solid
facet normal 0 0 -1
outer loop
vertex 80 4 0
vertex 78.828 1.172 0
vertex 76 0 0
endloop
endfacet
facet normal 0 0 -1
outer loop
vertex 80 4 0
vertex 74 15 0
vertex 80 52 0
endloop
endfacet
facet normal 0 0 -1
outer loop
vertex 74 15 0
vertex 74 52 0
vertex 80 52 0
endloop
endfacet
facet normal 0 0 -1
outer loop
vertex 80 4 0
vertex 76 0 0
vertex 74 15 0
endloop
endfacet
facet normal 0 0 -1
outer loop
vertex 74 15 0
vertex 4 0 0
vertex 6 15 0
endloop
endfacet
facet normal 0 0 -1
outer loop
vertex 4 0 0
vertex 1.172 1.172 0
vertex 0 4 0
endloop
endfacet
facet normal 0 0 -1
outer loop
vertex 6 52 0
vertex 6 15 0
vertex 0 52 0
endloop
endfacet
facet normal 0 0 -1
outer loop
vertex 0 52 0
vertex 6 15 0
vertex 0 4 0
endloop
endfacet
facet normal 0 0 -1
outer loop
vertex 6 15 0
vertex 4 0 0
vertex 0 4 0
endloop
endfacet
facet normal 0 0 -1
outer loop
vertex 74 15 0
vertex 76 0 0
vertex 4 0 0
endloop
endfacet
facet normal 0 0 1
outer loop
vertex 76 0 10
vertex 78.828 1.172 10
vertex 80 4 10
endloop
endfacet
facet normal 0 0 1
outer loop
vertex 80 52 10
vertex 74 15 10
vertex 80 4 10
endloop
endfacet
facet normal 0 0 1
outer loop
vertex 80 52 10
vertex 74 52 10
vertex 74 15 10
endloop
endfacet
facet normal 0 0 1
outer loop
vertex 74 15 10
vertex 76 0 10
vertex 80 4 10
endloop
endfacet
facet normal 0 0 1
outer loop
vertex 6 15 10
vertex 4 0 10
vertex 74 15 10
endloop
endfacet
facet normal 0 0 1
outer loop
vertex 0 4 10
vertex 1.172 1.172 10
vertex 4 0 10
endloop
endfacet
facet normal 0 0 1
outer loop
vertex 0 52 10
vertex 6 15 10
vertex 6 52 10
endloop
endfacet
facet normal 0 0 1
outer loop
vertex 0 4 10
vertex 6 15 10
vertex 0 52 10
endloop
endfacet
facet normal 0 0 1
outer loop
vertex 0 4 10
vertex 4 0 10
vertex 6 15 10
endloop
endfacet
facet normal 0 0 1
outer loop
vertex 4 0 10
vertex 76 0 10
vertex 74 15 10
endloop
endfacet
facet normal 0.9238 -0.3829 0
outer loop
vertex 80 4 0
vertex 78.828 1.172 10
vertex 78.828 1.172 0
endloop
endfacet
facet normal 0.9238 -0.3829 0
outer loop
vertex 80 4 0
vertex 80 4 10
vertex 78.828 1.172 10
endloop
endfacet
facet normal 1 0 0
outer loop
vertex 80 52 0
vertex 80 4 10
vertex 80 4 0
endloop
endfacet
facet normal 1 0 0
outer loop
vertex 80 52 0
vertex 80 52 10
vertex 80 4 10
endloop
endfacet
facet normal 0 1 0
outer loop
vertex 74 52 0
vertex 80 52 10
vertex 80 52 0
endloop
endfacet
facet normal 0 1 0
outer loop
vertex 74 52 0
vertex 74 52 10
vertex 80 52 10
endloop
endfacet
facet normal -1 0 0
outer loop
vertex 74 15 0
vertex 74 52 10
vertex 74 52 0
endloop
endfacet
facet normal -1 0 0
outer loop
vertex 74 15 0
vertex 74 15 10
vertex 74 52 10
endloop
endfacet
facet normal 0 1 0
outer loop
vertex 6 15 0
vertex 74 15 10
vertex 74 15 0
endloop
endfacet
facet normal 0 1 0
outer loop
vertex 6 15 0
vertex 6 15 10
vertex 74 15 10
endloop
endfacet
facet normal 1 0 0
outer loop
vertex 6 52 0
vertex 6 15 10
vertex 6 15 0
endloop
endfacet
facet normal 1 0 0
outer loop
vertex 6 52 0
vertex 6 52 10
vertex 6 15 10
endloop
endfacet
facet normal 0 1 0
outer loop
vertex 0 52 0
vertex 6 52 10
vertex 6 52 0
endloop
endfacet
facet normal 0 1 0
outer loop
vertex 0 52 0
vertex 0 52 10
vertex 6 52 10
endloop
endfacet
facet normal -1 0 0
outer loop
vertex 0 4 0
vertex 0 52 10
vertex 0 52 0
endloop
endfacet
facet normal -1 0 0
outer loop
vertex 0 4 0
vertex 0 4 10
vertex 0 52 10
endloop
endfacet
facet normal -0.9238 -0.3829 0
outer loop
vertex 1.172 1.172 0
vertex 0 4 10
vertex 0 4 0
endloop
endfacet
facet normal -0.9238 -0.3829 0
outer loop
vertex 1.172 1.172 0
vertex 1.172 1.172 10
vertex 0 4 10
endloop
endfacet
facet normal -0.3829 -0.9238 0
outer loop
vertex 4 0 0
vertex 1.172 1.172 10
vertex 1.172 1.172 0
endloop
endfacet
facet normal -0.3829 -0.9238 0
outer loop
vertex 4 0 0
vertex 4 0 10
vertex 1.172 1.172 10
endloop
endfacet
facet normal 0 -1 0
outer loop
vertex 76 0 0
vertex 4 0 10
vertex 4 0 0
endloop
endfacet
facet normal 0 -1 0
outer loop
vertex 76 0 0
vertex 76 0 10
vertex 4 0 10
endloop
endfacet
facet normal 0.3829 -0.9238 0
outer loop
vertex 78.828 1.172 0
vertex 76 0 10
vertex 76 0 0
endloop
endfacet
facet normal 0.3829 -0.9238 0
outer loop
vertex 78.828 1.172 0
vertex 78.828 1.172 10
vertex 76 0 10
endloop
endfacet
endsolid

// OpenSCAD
$fn = 32;

// ----------------------------------------------------------------------
// Heat sink frame: 80 x 52 mm frame, 6 mm walls
// ----------------------------------------------------------------------

// --- parameters (mm) ---
profile_height = 10;      // extrusion height
profile_points = 12;      // points of the closed outline

profile = [[0, 4], [1.172, 1.172], [4, 0], [76, 0], [78.828, 1.172], [80, 4], [80, 52], [74, 52], [74, 15], [6, 15], [6, 52], [0, 52]];  // single closed polygon, 12 points, counter clockwise

// --- the one profile operation ---
linear_extrude(height = profile_height) polygon(points = profile);
